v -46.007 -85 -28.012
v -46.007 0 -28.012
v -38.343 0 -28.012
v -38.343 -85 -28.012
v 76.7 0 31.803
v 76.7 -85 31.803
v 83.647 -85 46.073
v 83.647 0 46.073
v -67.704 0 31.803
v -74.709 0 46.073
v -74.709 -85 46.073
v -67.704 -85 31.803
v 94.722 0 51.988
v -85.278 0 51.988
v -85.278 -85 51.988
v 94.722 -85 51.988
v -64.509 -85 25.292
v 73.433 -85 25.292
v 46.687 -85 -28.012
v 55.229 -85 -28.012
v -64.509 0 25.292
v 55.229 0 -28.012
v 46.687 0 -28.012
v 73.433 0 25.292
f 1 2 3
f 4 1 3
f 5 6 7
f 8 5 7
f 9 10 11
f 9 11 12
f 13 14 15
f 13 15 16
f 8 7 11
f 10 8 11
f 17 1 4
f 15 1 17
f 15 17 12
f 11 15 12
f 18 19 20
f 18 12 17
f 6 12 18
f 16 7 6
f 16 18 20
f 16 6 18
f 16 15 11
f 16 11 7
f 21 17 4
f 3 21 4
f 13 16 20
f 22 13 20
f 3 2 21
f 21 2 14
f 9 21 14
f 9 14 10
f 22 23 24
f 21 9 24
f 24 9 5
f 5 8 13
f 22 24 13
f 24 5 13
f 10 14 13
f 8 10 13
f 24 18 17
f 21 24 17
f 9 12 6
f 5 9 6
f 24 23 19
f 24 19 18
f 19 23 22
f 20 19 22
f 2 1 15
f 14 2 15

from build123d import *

# Parameters (mm, degrees)
F0_W     = 180
F0_H     = 80
F1_DEPTH = 85
F3_DEPTH = 85.001
F5_DEPTH = 85.001


with BuildPart() as f1:
    # F0 (on Front) → F1 (new body)
    with BuildSketch(Plane.XZ):
        with Locations((4.7223418951, 11.9884983084)):
            Rectangle(F0_W, F0_H)
    extrude(amount=F1_DEPTH)

    # F2 (on face) → F3 (cut, through all)
    with BuildSketch(Plane.XZ.offset(85)):
        Polygon((-46.0070036352, -28.0115016916), (-85.2776581049, 51.9884983084), (-85.2776581049, -28.0115016916), align=None)
        Polygon((94.7223418951, -28.0115016916), (94.7223418951, 51.9884983084), (55.2294403315, -28.0115016916), align=None)
    extrude(amount=-F3_DEPTH, mode=Mode.SUBTRACT)

    # F4 (on face) → F5 (cut, through all)
    with BuildSketch(Plane.XZ.offset(85)):
        Polygon((-74.7092828557, 46.072713804), (-67.7043439121, 31.8026405634), (76.6995772719, 31.8026405634), (83.6467270564, 46.072713804), align=None)
        Polygon((73.4329734772, 25.2924152588), (-64.5085838063, 25.2924152588), (-38.3425875008, -28.0115016916), (46.6869287193, -28.0115016916), align=None)
    extrude(amount=-F5_DEPTH, mode=Mode.SUBTRACT)


solid = f1.part
